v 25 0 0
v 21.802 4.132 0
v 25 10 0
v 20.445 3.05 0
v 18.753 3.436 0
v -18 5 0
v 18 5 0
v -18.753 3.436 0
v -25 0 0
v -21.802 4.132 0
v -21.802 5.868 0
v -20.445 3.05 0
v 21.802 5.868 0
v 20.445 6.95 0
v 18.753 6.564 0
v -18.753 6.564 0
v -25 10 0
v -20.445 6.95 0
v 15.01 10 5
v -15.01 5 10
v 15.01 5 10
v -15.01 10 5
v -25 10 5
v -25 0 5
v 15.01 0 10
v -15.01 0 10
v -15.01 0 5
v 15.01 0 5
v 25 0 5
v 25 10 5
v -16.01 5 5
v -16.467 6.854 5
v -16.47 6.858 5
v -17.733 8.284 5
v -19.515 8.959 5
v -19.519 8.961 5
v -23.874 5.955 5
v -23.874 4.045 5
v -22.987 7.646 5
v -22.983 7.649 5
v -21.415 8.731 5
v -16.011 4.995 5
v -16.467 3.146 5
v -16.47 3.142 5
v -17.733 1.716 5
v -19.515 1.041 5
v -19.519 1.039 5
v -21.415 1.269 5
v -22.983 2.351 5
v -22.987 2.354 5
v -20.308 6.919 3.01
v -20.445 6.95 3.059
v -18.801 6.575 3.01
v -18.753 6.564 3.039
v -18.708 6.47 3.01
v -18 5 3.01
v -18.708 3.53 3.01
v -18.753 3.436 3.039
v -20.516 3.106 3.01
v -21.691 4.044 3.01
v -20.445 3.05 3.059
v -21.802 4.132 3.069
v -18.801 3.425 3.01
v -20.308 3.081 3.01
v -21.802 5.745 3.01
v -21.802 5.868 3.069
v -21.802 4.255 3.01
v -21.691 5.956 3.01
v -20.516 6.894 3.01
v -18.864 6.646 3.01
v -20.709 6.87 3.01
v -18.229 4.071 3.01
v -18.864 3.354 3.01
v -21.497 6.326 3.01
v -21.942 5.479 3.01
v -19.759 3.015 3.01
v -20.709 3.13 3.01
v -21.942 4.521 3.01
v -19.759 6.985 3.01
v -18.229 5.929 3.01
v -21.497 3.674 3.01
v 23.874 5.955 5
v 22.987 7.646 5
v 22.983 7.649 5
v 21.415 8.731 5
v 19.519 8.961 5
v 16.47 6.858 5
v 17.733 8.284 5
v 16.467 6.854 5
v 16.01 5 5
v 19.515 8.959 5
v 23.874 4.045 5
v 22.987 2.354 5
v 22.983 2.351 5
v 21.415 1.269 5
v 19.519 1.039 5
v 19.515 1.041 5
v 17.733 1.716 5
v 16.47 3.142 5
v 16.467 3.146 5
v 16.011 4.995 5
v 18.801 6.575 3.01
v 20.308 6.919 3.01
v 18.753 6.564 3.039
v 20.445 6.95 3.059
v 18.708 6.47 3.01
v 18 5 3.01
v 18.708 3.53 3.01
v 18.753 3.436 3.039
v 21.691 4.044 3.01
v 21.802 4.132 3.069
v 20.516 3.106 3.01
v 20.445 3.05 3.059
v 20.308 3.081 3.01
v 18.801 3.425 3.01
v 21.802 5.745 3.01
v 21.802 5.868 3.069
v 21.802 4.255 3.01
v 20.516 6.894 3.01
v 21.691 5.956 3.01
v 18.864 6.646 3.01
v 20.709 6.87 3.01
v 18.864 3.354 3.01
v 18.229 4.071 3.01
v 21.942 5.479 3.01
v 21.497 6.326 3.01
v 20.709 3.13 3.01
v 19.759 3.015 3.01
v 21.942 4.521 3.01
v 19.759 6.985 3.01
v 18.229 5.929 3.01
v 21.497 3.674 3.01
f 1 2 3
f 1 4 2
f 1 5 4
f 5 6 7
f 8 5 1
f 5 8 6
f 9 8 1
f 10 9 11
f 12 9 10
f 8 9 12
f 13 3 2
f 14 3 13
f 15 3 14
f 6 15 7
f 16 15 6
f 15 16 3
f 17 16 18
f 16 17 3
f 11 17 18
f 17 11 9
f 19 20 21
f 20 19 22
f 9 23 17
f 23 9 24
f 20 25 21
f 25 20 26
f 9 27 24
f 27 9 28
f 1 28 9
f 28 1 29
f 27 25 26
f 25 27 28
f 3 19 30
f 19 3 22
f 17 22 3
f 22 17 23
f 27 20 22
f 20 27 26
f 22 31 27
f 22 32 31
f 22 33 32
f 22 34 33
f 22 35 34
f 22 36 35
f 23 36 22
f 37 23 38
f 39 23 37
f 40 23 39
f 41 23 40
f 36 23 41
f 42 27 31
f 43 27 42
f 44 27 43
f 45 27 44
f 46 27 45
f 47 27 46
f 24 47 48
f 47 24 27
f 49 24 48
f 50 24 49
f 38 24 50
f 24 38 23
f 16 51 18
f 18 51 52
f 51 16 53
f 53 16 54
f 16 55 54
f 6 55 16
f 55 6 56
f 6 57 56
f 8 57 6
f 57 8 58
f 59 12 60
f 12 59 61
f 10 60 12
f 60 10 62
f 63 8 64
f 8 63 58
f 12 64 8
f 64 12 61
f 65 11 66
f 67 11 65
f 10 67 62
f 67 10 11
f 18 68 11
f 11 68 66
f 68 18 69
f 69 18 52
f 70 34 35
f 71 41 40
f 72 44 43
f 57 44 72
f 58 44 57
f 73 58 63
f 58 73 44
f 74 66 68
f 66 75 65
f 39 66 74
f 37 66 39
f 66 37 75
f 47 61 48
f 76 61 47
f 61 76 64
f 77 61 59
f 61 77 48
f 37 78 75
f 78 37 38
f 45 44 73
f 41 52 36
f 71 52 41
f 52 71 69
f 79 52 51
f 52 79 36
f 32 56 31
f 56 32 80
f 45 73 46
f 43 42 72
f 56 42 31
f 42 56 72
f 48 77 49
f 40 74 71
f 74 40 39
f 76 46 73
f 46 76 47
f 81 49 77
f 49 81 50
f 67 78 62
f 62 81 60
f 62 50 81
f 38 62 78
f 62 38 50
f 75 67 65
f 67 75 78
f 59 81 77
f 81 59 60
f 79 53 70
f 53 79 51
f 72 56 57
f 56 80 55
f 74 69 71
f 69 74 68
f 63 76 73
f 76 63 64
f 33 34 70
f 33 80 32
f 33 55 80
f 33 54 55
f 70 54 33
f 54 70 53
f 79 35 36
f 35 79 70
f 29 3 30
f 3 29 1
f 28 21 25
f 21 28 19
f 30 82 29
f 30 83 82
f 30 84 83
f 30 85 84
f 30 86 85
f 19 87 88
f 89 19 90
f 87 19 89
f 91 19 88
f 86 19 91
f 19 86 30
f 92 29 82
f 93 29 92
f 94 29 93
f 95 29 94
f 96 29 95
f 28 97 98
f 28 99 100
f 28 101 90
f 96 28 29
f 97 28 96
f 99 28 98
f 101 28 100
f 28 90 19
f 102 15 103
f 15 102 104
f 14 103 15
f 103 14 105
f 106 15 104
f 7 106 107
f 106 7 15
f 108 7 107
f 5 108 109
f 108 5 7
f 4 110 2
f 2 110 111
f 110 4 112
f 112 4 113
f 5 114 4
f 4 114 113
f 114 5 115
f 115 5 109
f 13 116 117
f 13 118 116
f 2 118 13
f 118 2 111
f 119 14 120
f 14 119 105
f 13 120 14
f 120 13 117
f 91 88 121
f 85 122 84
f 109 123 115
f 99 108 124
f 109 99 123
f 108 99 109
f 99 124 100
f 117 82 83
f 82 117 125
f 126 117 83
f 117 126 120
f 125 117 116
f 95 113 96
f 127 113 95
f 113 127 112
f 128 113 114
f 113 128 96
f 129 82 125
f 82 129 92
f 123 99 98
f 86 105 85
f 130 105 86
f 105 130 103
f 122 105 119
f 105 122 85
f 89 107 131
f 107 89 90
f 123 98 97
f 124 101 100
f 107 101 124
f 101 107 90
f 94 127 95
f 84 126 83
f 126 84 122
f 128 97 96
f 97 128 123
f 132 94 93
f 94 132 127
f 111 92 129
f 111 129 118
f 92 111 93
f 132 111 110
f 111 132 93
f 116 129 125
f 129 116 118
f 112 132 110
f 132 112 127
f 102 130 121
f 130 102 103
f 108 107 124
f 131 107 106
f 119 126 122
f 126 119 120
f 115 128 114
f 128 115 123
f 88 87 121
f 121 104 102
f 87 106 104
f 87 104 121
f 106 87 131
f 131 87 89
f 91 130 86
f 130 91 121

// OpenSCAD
HEIGHT = 10;

WIDTH = 10;

LENGTH = 50;

SCREW = 4;

EPS = 0.01; 

module saw_holder(
    length=LENGTH,
    width=WIDTH,
    height=HEIGHT,
    screw=SCREW
) {

    module reflect(v=[0,1,0]) 
    { 
        children(); 
        mirror(v) children(); 
    }    

    module body() {
        rotate([0,-90]) linear_extrude(length/2) hull() {
            square([width/2, height]);
            square([width, height/2]);
        }
    }
    
    reflect([1,0,0]) 
    difference() {
        body();
        translate([-length/2 -EPS,-EPS,height/2]) cube([width,width + 2 * EPS, height/2+EPS]);
        translate([-length/2 + width/2, width/2, -EPS]) cylinder(height, r=screw/2);
        translate([-length/2 + width/2, width/2, height/2 - screw/2 + EPS]) cylinder(screw/2, r1=screw/2, r2=screw);
    }
}

saw_holder();
